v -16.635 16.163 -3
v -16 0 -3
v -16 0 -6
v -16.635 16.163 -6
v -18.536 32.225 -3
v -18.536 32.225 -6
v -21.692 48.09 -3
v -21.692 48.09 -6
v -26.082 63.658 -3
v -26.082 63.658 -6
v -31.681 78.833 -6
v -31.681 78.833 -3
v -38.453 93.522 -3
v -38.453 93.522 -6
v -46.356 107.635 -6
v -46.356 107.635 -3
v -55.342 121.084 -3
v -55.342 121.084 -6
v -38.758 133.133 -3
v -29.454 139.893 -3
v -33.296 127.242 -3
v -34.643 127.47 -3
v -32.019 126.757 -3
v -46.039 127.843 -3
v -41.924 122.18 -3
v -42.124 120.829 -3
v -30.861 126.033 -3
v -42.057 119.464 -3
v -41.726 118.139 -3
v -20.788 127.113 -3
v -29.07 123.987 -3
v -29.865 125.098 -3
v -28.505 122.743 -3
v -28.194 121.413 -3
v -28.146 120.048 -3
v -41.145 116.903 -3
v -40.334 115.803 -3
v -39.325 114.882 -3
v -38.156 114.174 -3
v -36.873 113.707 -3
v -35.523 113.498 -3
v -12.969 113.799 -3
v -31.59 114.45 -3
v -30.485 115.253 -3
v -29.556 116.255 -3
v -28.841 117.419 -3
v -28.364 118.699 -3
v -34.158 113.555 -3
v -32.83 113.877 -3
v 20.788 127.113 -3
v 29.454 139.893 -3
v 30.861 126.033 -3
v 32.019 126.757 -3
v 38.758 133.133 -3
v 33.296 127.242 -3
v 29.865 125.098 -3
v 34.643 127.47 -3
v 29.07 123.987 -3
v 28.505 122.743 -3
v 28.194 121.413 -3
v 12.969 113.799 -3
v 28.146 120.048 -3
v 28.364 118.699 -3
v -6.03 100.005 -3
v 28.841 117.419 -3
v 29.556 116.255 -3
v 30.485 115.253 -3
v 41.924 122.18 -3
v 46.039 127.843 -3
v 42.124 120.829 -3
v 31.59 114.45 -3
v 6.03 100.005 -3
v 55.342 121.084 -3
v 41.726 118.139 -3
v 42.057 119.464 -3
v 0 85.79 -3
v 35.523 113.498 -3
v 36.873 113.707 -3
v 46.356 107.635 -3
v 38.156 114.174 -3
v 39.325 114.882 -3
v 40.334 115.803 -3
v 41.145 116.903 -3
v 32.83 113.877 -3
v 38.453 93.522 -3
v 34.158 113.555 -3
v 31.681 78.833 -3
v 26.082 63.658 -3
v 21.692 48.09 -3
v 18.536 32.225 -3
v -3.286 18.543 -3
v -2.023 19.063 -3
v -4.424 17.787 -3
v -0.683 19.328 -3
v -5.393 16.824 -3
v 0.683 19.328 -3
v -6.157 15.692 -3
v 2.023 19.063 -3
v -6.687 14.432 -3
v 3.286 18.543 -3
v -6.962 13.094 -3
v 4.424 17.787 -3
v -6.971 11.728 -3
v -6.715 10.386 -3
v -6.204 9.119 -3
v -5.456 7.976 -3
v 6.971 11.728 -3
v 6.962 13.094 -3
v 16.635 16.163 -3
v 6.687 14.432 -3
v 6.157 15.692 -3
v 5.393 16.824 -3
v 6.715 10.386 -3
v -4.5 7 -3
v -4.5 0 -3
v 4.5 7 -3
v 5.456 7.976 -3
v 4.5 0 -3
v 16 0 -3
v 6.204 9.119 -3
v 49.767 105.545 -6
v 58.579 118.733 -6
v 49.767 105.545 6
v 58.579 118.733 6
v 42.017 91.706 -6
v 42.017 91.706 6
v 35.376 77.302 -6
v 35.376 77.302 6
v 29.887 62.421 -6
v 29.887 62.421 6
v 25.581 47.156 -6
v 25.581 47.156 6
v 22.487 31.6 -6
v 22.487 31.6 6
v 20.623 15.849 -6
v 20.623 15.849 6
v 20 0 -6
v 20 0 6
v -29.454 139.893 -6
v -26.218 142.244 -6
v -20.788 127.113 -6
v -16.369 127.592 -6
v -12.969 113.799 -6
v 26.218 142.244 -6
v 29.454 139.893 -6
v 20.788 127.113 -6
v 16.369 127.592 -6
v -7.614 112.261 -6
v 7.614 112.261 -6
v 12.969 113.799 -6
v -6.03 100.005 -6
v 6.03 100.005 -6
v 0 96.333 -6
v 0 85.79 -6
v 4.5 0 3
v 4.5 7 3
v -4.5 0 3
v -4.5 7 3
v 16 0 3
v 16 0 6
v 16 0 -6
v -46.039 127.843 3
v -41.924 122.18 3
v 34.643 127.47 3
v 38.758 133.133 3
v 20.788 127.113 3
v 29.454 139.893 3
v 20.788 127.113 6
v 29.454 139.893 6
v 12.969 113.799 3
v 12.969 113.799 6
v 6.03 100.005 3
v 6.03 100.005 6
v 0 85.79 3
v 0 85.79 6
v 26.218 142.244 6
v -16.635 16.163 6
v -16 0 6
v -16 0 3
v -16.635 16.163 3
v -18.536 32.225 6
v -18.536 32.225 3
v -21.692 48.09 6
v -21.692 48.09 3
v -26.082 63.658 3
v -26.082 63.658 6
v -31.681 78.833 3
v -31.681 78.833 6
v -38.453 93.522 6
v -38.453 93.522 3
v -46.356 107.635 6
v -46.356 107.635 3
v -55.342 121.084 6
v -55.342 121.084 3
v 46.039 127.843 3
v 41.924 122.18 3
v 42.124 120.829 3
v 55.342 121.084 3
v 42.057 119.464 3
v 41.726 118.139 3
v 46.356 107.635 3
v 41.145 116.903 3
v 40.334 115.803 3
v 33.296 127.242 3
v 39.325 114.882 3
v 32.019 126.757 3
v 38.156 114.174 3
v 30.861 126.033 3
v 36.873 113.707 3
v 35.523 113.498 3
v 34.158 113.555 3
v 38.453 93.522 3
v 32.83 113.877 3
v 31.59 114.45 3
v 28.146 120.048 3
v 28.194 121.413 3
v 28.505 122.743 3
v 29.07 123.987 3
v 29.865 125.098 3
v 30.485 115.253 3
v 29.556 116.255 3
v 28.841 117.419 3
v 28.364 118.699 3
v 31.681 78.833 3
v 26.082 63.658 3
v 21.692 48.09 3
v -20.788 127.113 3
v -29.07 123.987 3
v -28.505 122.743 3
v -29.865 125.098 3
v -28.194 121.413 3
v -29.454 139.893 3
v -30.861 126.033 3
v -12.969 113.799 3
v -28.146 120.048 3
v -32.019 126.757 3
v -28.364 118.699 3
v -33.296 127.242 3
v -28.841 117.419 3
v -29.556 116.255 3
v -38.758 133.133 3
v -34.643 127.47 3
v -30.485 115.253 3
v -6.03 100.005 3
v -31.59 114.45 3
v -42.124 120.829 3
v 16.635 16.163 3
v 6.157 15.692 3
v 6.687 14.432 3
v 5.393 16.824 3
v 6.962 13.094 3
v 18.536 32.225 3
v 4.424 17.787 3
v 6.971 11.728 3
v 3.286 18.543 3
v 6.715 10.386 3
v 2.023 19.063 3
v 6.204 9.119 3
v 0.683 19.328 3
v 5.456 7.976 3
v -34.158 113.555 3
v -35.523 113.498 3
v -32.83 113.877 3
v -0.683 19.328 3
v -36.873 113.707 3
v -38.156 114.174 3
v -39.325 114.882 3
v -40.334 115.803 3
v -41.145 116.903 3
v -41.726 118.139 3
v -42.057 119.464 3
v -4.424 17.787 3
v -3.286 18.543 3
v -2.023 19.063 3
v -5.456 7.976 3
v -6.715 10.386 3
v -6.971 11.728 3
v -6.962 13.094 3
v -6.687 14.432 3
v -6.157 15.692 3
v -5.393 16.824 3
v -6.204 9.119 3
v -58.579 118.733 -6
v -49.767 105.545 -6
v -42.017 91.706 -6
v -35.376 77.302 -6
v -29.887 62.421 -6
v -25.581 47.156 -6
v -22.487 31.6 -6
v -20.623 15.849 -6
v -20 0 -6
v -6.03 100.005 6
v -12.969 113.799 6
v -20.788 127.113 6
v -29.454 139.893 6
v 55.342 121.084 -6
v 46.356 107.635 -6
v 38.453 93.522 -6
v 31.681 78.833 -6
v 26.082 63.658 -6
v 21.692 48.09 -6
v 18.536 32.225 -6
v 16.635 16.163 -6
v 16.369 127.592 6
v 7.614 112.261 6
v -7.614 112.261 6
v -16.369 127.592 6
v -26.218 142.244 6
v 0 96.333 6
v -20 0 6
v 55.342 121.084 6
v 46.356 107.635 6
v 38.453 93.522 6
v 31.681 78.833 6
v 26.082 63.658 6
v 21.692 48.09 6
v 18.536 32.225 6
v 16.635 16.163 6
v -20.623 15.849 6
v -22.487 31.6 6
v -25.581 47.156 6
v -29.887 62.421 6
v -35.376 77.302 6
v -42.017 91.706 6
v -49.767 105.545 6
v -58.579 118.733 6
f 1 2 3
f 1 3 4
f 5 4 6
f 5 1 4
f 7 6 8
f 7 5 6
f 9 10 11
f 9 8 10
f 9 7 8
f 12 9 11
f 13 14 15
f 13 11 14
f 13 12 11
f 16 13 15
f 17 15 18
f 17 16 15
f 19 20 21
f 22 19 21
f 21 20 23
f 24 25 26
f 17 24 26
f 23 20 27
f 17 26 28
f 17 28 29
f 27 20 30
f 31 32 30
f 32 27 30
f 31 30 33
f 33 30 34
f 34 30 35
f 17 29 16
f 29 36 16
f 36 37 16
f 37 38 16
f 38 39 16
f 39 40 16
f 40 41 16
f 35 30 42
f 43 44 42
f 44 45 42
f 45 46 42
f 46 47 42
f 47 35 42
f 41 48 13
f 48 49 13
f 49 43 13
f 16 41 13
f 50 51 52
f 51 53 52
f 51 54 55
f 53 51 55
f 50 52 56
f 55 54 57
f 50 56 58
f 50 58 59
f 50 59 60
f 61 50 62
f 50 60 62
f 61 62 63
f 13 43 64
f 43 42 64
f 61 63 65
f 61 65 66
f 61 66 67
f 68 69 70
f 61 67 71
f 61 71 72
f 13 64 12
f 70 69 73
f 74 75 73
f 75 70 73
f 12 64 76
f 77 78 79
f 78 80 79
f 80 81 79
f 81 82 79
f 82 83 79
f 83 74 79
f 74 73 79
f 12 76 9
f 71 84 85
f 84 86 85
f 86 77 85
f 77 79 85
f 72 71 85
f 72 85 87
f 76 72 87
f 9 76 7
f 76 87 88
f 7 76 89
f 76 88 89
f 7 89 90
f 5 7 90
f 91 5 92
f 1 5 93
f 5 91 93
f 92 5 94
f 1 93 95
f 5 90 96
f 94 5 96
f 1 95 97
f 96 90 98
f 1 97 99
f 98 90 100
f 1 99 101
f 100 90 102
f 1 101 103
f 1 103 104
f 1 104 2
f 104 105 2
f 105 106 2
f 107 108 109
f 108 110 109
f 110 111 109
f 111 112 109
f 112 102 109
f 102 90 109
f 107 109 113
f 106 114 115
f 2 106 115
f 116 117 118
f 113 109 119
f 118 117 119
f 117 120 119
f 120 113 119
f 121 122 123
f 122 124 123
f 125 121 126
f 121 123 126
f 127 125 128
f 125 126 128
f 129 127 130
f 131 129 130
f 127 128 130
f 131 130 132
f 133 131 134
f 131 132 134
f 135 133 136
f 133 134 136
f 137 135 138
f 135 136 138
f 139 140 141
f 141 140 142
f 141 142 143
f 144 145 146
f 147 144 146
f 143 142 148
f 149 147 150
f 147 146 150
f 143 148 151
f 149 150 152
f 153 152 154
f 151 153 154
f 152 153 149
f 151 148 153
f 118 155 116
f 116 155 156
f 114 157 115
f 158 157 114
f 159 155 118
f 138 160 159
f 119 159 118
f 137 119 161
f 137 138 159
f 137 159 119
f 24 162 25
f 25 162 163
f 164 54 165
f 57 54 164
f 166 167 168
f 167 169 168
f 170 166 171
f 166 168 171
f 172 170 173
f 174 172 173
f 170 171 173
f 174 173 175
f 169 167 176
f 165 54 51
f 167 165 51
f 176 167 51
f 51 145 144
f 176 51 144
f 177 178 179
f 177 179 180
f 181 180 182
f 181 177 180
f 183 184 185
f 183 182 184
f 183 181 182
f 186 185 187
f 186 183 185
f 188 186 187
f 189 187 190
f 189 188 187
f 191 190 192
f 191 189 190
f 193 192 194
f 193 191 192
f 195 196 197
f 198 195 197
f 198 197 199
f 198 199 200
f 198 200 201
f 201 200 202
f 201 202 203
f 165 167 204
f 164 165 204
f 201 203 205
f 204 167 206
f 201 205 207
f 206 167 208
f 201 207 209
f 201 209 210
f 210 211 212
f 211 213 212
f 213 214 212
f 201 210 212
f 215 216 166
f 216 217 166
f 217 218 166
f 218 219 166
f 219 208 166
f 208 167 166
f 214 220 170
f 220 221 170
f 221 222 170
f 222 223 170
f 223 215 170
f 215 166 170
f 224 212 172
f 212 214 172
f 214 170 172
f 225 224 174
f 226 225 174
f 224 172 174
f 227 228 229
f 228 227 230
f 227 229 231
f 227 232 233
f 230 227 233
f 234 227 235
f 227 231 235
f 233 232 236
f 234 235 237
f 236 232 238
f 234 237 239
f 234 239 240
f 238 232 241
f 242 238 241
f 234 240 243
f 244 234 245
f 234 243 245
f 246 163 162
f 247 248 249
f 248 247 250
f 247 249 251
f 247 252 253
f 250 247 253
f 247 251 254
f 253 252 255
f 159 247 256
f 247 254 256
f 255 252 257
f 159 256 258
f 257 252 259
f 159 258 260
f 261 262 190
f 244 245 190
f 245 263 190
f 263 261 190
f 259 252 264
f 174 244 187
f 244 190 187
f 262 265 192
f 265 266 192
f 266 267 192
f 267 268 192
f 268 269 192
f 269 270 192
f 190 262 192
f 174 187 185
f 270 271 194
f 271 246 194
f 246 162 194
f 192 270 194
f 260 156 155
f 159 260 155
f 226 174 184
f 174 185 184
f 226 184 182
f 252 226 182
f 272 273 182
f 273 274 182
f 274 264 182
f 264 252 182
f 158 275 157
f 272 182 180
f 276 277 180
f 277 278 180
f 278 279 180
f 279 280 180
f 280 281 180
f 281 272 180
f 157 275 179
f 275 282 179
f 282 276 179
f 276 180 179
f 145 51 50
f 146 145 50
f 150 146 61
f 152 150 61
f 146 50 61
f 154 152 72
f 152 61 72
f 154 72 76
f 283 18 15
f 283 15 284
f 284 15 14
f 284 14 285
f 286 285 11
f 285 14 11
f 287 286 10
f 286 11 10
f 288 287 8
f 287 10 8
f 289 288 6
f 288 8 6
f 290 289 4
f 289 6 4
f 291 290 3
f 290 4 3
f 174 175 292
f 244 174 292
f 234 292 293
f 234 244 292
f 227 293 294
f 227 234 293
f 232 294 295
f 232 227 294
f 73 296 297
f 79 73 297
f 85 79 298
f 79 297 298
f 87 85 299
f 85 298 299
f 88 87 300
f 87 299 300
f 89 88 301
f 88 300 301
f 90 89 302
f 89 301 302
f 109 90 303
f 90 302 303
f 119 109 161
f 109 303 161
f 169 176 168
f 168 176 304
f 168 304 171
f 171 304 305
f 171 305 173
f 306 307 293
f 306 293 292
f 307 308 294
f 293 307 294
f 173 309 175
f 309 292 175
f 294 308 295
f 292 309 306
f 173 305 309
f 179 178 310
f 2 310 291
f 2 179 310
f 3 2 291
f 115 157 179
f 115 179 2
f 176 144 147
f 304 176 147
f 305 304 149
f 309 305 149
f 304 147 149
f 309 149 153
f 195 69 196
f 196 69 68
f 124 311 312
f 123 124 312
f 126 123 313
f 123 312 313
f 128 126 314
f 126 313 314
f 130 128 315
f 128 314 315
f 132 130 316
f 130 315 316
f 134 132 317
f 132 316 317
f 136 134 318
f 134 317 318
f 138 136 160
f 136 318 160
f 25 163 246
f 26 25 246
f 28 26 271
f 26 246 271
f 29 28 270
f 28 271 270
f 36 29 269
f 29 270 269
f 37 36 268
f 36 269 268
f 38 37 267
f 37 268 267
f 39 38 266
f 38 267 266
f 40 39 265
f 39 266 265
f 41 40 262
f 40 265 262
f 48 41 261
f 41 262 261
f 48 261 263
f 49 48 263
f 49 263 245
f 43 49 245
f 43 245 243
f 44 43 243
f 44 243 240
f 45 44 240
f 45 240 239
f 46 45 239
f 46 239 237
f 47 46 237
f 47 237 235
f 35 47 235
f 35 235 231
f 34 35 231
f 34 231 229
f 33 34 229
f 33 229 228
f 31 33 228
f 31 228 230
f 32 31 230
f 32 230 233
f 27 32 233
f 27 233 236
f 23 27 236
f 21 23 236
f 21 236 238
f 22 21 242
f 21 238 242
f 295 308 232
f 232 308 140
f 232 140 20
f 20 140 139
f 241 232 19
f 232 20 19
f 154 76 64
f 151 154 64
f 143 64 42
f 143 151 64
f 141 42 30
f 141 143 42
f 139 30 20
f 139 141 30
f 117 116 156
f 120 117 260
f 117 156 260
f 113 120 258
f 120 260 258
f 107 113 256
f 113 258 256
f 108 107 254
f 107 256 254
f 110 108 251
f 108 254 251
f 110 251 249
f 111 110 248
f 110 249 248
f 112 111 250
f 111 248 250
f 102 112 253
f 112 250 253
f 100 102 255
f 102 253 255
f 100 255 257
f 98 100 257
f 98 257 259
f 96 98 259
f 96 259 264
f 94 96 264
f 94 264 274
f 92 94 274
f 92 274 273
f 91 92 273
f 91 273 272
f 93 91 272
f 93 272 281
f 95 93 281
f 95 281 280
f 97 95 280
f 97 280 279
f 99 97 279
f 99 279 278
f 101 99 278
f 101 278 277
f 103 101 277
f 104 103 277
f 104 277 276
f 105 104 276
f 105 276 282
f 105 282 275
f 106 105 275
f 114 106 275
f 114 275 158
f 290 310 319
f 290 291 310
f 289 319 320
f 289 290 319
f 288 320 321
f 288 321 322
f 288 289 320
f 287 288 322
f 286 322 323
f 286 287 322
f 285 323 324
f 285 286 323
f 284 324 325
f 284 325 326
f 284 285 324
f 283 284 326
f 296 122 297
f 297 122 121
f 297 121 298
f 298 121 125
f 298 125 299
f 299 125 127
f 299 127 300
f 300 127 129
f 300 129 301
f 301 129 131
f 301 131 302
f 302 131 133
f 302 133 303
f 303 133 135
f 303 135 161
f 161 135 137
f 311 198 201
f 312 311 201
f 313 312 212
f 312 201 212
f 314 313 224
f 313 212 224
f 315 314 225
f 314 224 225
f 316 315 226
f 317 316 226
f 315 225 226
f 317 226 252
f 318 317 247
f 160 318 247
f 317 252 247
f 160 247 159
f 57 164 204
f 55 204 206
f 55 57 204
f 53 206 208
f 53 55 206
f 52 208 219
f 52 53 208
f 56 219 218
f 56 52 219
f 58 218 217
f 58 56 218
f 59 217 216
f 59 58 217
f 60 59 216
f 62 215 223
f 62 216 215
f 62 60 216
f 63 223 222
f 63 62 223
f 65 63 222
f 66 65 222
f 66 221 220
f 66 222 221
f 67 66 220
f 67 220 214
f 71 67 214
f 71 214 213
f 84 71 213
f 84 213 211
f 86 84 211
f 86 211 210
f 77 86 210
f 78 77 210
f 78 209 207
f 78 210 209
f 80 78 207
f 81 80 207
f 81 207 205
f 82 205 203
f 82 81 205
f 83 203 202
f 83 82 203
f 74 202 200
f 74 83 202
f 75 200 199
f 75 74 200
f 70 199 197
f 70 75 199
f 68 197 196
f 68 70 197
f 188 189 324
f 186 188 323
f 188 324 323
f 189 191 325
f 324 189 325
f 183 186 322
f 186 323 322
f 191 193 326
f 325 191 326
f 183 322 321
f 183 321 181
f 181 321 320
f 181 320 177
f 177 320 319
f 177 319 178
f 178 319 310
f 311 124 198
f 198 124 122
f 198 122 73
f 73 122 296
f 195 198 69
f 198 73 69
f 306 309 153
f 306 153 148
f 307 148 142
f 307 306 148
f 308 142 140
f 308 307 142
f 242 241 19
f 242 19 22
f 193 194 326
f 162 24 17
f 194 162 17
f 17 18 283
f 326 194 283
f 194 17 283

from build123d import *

# Parameters (mm, degrees)
SKETCH013_W          = 32
SKETCH013_H          = 3
POCKET_DEPTH         = 6.001
POCKET_DEPTH_BACK    = -6.001
POCKET001_DEPTH      = 6.001
POCKET001_DEPTH_BACK = -6.001
POCKET002_DEPTH      = 6.001
POCKET002_DEPTH_BACK = -6.001


with BuildPart() as part:
    # AdditivePipe: sweep along a path in Sketch
    with BuildLine(Plane.XY) as additivepipe_path:
        ThreePointArc((0, 0), (-10.865453, 68.601773), (-42.398227, 130.488326))
    # Sketch002 → AdditivePipe (sweep)
    with BuildSketch(Plane.XZ):
        Polygon((-20, 6), (-20, -6), (-16, -6), (-16, -3), (-9, -3), (9, -3), (16, -3), (16, -6), (20, -6), (20, 6), (16, 6), (16, 3), (9, 3), (-9, 3), (-16, 3), (-16, 6), align=None)
    sweep(path=additivepipe_path.line)

    # AdditivePipe001: sweep along a path in Sketch001
    with BuildLine(Plane.XY) as additivepipe001_path:
        ThreePointArc((42.398227, 130.488326), (10.865453, 68.601773), (0, 0))
    # Sketch002 → AdditivePipe001 (sweep)
    with BuildSketch(Plane.XZ):
        Polygon((-20, 6), (-20, -6), (-16, -6), (-16, -3), (-9, -3), (9, -3), (16, -3), (16, -6), (20, -6), (20, 6), (16, 6), (16, 3), (9, 3), (-9, 3), (-16, 3), (-16, 6), align=None)
    sweep(path=additivepipe001_path.line)

    # SubtractivePipe: sweep along a path in Sketch
    with BuildLine(Plane.XY) as subtractivepipe_path:
        ThreePointArc((0, 0), (-10.865453, 68.601773), (-42.398227, 130.488326))
    # Sketch013 (on Face1 of AdditivePipe001) → SubtractivePipe (sweep, cut)
    with BuildSketch(Plane.XZ):
        with Locations((0, 4.5)):
            Rectangle(SKETCH013_W, SKETCH013_H)
    subtractivepipe = sweep(path=subtractivepipe_path.line, mode=Mode.SUBTRACT)

    # SubtractivePipe001: sweep along a path in Sketch001
    with BuildLine(Plane.XY) as subtractivepipe001_path:
        ThreePointArc((42.398227, 130.488326), (10.865453, 68.601773), (0, 0))
    # Sketch013 (on Face1 of AdditivePipe001) → SubtractivePipe001 (sweep, cut)
    with BuildSketch(Plane.XZ):
        with Locations((0, 4.5)):
            Rectangle(SKETCH013_W, SKETCH013_H)
    subtractivepipe001 = sweep(path=subtractivepipe001_path.line, mode=Mode.SUBTRACT)

    # Mirrored: SubtractivePipe across XY
    add(subtractivepipe.mirror(Plane.XY), mode=Mode.SUBTRACT)

    # Mirrored001: SubtractivePipe001 across XY
    add(subtractivepipe001.mirror(Plane.XY), mode=Mode.SUBTRACT)

    # Sketch007 → Pocket (cut, two sides)
    with BuildSketch(Plane.XY) as pocket_sk:
        with BuildLine():
            Line((-4.5, 0), (4.5, 0))
            Line((4.5, 0), (4.5, 7))
            ThreePointArc((4.5, 7), (0, 19.361903), (-4.5, 7))
            Line((-4.5, 0), (-4.5, 7))
        make_face()
    extrude(amount=-POCKET_DEPTH, mode=Mode.SUBTRACT)
    extrude(pocket_sk.sketch, amount=-POCKET_DEPTH_BACK, mode=Mode.SUBTRACT)

    # Sketch008 → Pocket001 (cut, two sides)
    with BuildSketch(Plane.XY) as pocket001_sk:
        with BuildLine():
            Line((-46.038804, 127.843292), (-38.757651, 133.13336))
            Line((-38.757651, 133.13336), (-34.643154, 127.470241))
            ThreePointArc((-41.924307, 122.180173), (-31.017586, 114.824218), (-34.643154, 127.470241))
            Line((-46.038804, 127.843292), (-41.924307, 122.180173))
        make_face()
    extrude(amount=-POCKET001_DEPTH, mode=Mode.SUBTRACT)
    extrude(pocket001_sk.sketch, amount=-POCKET001_DEPTH_BACK, mode=Mode.SUBTRACT)

    # Sketch009 → Pocket002 (cut, two sides)
    with BuildSketch(Plane.XY) as pocket002_sk:
        with BuildLine():
            Line((38.757651, 133.13336), (46.038804, 127.843292))
            Line((46.038804, 127.843292), (41.924307, 122.180173))
            ThreePointArc((34.643154, 127.470241), (31.017586, 114.824218), (41.924307, 122.180173))
            Line((38.757651, 133.13336), (34.643154, 127.470241))
        make_face()
    extrude(amount=-POCKET002_DEPTH, mode=Mode.SUBTRACT)
    extrude(pocket002_sk.sketch, amount=-POCKET002_DEPTH_BACK, mode=Mode.SUBTRACT)


solid = part.part
